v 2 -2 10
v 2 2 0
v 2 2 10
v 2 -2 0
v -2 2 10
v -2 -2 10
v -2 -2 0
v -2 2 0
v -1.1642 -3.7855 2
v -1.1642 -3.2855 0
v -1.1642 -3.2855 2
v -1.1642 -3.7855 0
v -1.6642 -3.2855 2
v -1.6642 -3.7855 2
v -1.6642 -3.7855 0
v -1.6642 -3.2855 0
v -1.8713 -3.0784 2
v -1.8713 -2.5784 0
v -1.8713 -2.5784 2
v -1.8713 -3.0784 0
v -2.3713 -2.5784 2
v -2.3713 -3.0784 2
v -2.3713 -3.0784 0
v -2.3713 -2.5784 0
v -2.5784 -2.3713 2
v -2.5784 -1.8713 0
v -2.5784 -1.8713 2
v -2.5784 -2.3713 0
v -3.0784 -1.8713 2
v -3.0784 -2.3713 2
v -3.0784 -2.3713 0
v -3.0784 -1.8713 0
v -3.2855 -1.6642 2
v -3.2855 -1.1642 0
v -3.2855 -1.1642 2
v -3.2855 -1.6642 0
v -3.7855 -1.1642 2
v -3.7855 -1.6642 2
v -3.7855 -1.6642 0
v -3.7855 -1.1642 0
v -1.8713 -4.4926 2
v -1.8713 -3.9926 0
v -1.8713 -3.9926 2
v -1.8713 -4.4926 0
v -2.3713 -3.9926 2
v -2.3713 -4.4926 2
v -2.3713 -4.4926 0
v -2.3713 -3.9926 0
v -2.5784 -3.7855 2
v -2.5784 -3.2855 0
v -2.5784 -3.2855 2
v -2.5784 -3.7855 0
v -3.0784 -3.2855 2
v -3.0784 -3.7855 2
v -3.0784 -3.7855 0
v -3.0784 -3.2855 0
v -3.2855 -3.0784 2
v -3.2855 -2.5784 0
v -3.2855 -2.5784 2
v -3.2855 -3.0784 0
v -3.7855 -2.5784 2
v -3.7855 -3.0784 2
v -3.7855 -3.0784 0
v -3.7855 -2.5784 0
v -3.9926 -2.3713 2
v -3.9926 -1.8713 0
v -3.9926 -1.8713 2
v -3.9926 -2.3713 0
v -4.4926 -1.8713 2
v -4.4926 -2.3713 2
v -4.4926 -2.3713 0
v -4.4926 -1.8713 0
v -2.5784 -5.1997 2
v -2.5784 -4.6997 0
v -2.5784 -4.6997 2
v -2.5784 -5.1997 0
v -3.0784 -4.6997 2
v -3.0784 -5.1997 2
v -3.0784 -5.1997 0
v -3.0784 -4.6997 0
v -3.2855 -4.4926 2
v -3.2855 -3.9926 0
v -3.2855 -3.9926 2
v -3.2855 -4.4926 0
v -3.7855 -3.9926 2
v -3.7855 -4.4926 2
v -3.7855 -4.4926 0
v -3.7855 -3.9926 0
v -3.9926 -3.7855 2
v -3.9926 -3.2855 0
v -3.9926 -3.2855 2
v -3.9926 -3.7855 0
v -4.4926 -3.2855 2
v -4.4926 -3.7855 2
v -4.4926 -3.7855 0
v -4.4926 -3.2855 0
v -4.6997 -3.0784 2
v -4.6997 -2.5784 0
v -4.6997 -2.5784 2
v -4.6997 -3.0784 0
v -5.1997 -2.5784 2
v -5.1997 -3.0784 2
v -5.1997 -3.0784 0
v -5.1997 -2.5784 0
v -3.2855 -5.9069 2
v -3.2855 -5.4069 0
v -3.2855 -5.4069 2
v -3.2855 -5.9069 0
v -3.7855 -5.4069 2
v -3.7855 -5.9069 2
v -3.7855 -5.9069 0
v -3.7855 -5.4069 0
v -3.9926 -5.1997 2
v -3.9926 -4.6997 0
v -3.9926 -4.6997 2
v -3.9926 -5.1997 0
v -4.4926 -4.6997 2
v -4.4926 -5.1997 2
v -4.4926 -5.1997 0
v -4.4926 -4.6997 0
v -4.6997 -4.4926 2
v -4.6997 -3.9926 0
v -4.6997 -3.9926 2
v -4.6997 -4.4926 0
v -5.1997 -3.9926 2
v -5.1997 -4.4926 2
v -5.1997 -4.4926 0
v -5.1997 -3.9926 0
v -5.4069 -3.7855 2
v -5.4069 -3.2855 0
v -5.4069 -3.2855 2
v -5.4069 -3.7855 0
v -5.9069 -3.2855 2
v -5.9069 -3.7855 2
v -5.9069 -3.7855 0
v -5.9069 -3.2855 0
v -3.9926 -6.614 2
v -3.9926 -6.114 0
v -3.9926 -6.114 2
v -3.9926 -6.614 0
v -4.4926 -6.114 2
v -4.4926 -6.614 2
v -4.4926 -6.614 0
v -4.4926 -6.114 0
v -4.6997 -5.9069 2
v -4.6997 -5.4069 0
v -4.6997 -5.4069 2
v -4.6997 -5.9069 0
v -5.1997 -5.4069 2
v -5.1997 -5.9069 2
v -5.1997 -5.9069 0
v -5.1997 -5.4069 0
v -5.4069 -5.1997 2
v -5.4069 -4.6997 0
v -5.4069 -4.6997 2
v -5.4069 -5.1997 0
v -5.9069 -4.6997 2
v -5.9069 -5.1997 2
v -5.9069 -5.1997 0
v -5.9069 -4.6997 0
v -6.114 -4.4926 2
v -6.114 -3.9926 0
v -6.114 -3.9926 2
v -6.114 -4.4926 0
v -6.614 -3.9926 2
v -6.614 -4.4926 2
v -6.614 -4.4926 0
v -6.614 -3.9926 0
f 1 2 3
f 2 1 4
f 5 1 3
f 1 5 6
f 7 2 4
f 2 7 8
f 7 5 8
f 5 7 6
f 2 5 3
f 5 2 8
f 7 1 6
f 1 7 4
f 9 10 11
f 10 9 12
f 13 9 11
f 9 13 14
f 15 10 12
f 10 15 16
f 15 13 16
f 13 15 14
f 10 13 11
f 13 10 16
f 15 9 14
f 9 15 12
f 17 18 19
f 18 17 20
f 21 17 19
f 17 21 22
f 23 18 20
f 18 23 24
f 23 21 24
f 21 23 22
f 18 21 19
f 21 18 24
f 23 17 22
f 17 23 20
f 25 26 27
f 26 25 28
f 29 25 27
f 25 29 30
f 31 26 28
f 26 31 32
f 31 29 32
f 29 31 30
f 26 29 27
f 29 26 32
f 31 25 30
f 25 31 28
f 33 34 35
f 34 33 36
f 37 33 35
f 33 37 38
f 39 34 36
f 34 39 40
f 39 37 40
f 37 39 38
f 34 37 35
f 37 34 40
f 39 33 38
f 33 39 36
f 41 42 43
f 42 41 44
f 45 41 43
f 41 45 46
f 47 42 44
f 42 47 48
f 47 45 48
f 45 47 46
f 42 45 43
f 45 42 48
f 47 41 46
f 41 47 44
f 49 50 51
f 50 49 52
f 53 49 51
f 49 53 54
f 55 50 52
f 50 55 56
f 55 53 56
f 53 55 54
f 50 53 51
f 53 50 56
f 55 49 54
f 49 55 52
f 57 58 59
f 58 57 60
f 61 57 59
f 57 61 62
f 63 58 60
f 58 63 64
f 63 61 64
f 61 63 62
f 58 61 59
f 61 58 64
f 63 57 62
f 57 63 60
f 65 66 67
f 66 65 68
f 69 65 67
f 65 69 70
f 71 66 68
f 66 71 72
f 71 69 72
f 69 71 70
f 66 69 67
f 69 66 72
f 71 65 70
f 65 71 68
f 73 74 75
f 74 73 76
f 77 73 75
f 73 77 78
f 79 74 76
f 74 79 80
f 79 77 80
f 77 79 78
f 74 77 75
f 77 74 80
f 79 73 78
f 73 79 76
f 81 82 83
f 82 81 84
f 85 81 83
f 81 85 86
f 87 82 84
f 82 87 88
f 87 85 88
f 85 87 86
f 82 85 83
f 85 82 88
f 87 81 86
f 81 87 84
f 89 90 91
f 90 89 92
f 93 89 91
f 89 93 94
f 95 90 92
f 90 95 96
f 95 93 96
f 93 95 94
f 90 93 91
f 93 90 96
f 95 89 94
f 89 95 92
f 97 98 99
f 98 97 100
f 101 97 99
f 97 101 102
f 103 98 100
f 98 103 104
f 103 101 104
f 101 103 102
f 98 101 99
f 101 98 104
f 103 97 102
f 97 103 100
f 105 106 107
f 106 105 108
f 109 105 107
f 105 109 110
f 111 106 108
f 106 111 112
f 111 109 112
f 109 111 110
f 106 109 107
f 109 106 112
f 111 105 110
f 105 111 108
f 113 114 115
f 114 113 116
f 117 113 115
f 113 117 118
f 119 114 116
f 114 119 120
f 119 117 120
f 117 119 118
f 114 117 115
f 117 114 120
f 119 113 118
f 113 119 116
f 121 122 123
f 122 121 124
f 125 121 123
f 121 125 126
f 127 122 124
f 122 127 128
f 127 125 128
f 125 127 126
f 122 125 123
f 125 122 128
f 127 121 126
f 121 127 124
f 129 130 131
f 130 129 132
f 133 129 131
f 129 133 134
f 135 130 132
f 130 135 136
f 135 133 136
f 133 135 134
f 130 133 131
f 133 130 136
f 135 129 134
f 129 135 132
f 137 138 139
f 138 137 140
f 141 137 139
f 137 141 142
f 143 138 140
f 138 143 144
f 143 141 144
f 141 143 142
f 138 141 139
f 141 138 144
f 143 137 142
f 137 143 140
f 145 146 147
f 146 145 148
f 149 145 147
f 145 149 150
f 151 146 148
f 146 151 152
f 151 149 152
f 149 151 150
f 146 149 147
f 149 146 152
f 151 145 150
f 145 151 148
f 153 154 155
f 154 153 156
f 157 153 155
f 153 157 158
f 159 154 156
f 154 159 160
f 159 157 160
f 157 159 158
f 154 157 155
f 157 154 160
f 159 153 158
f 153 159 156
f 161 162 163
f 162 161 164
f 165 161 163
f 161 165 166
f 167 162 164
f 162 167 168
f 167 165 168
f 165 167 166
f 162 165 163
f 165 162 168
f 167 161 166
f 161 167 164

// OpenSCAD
translate([0, 0, 5]) color([0,1,0,0.9]) cube([4, 4, 10], center=true);
translate([-1.414214, -3.535534, 1]) color([1,0,0]) cube([0.5, 0.5, 2], center=true);
translate([-2.12132, -2.828427, 1]) color([1,0,0]) cube([0.5, 0.5, 2], center=true);
translate([-2.828427, -2.12132, 1]) color([1,0,0]) cube([0.5, 0.5, 2], center=true);
translate([-3.535534, -1.414214, 1]) color([1,0,0]) cube([0.5, 0.5, 2], center=true);
translate([-2.12132, -4.242641, 1]) color([1,0,0]) cube([0.5, 0.5, 2], center=true);
translate([-2.828427, -3.535534, 1]) color([1,0,0]) cube([0.5, 0.5, 2], center=true);
translate([-3.535534, -2.828427, 1]) color([1,0,0]) cube([0.5, 0.5, 2], center=true);
translate([-4.242641, -2.12132, 1]) color([1,0,0]) cube([0.5, 0.5, 2], center=true);
translate([-2.828427, -4.949747, 1]) color([1,0,0]) cube([0.5, 0.5, 2], center=true);
translate([-3.535534, -4.242641, 1]) color([1,0,0]) cube([0.5, 0.5, 2], center=true);
translate([-4.242641, -3.535534, 1]) color([1,0,0]) cube([0.5, 0.5, 2], center=true);
translate([-4.949747, -2.828427, 1]) color([1,0,0]) cube([0.5, 0.5, 2], center=true);
translate([-3.535534, -5.656854, 1]) color([1,0,0]) cube([0.5, 0.5, 2], center=true);
translate([-4.242641, -4.949747, 1]) color([1,0,0]) cube([0.5, 0.5, 2], center=true);
translate([-4.949747, -4.242641, 1]) color([1,0,0]) cube([0.5, 0.5, 2], center=true);
translate([-5.656854, -3.535534, 1]) color([1,0,0]) cube([0.5, 0.5, 2], center=true);
translate([-4.242641, -6.363961, 1]) color([1,0,0]) cube([0.5, 0.5, 2], center=true);
translate([-4.949747, -5.656854, 1]) color([1,0,0]) cube([0.5, 0.5, 2], center=true);
translate([-5.656854, -4.949747, 1]) color([1,0,0]) cube([0.5, 0.5, 2], center=true);
translate([-6.363961, -4.242641, 1]) color([1,0,0]) cube([0.5, 0.5, 2], center=true);
